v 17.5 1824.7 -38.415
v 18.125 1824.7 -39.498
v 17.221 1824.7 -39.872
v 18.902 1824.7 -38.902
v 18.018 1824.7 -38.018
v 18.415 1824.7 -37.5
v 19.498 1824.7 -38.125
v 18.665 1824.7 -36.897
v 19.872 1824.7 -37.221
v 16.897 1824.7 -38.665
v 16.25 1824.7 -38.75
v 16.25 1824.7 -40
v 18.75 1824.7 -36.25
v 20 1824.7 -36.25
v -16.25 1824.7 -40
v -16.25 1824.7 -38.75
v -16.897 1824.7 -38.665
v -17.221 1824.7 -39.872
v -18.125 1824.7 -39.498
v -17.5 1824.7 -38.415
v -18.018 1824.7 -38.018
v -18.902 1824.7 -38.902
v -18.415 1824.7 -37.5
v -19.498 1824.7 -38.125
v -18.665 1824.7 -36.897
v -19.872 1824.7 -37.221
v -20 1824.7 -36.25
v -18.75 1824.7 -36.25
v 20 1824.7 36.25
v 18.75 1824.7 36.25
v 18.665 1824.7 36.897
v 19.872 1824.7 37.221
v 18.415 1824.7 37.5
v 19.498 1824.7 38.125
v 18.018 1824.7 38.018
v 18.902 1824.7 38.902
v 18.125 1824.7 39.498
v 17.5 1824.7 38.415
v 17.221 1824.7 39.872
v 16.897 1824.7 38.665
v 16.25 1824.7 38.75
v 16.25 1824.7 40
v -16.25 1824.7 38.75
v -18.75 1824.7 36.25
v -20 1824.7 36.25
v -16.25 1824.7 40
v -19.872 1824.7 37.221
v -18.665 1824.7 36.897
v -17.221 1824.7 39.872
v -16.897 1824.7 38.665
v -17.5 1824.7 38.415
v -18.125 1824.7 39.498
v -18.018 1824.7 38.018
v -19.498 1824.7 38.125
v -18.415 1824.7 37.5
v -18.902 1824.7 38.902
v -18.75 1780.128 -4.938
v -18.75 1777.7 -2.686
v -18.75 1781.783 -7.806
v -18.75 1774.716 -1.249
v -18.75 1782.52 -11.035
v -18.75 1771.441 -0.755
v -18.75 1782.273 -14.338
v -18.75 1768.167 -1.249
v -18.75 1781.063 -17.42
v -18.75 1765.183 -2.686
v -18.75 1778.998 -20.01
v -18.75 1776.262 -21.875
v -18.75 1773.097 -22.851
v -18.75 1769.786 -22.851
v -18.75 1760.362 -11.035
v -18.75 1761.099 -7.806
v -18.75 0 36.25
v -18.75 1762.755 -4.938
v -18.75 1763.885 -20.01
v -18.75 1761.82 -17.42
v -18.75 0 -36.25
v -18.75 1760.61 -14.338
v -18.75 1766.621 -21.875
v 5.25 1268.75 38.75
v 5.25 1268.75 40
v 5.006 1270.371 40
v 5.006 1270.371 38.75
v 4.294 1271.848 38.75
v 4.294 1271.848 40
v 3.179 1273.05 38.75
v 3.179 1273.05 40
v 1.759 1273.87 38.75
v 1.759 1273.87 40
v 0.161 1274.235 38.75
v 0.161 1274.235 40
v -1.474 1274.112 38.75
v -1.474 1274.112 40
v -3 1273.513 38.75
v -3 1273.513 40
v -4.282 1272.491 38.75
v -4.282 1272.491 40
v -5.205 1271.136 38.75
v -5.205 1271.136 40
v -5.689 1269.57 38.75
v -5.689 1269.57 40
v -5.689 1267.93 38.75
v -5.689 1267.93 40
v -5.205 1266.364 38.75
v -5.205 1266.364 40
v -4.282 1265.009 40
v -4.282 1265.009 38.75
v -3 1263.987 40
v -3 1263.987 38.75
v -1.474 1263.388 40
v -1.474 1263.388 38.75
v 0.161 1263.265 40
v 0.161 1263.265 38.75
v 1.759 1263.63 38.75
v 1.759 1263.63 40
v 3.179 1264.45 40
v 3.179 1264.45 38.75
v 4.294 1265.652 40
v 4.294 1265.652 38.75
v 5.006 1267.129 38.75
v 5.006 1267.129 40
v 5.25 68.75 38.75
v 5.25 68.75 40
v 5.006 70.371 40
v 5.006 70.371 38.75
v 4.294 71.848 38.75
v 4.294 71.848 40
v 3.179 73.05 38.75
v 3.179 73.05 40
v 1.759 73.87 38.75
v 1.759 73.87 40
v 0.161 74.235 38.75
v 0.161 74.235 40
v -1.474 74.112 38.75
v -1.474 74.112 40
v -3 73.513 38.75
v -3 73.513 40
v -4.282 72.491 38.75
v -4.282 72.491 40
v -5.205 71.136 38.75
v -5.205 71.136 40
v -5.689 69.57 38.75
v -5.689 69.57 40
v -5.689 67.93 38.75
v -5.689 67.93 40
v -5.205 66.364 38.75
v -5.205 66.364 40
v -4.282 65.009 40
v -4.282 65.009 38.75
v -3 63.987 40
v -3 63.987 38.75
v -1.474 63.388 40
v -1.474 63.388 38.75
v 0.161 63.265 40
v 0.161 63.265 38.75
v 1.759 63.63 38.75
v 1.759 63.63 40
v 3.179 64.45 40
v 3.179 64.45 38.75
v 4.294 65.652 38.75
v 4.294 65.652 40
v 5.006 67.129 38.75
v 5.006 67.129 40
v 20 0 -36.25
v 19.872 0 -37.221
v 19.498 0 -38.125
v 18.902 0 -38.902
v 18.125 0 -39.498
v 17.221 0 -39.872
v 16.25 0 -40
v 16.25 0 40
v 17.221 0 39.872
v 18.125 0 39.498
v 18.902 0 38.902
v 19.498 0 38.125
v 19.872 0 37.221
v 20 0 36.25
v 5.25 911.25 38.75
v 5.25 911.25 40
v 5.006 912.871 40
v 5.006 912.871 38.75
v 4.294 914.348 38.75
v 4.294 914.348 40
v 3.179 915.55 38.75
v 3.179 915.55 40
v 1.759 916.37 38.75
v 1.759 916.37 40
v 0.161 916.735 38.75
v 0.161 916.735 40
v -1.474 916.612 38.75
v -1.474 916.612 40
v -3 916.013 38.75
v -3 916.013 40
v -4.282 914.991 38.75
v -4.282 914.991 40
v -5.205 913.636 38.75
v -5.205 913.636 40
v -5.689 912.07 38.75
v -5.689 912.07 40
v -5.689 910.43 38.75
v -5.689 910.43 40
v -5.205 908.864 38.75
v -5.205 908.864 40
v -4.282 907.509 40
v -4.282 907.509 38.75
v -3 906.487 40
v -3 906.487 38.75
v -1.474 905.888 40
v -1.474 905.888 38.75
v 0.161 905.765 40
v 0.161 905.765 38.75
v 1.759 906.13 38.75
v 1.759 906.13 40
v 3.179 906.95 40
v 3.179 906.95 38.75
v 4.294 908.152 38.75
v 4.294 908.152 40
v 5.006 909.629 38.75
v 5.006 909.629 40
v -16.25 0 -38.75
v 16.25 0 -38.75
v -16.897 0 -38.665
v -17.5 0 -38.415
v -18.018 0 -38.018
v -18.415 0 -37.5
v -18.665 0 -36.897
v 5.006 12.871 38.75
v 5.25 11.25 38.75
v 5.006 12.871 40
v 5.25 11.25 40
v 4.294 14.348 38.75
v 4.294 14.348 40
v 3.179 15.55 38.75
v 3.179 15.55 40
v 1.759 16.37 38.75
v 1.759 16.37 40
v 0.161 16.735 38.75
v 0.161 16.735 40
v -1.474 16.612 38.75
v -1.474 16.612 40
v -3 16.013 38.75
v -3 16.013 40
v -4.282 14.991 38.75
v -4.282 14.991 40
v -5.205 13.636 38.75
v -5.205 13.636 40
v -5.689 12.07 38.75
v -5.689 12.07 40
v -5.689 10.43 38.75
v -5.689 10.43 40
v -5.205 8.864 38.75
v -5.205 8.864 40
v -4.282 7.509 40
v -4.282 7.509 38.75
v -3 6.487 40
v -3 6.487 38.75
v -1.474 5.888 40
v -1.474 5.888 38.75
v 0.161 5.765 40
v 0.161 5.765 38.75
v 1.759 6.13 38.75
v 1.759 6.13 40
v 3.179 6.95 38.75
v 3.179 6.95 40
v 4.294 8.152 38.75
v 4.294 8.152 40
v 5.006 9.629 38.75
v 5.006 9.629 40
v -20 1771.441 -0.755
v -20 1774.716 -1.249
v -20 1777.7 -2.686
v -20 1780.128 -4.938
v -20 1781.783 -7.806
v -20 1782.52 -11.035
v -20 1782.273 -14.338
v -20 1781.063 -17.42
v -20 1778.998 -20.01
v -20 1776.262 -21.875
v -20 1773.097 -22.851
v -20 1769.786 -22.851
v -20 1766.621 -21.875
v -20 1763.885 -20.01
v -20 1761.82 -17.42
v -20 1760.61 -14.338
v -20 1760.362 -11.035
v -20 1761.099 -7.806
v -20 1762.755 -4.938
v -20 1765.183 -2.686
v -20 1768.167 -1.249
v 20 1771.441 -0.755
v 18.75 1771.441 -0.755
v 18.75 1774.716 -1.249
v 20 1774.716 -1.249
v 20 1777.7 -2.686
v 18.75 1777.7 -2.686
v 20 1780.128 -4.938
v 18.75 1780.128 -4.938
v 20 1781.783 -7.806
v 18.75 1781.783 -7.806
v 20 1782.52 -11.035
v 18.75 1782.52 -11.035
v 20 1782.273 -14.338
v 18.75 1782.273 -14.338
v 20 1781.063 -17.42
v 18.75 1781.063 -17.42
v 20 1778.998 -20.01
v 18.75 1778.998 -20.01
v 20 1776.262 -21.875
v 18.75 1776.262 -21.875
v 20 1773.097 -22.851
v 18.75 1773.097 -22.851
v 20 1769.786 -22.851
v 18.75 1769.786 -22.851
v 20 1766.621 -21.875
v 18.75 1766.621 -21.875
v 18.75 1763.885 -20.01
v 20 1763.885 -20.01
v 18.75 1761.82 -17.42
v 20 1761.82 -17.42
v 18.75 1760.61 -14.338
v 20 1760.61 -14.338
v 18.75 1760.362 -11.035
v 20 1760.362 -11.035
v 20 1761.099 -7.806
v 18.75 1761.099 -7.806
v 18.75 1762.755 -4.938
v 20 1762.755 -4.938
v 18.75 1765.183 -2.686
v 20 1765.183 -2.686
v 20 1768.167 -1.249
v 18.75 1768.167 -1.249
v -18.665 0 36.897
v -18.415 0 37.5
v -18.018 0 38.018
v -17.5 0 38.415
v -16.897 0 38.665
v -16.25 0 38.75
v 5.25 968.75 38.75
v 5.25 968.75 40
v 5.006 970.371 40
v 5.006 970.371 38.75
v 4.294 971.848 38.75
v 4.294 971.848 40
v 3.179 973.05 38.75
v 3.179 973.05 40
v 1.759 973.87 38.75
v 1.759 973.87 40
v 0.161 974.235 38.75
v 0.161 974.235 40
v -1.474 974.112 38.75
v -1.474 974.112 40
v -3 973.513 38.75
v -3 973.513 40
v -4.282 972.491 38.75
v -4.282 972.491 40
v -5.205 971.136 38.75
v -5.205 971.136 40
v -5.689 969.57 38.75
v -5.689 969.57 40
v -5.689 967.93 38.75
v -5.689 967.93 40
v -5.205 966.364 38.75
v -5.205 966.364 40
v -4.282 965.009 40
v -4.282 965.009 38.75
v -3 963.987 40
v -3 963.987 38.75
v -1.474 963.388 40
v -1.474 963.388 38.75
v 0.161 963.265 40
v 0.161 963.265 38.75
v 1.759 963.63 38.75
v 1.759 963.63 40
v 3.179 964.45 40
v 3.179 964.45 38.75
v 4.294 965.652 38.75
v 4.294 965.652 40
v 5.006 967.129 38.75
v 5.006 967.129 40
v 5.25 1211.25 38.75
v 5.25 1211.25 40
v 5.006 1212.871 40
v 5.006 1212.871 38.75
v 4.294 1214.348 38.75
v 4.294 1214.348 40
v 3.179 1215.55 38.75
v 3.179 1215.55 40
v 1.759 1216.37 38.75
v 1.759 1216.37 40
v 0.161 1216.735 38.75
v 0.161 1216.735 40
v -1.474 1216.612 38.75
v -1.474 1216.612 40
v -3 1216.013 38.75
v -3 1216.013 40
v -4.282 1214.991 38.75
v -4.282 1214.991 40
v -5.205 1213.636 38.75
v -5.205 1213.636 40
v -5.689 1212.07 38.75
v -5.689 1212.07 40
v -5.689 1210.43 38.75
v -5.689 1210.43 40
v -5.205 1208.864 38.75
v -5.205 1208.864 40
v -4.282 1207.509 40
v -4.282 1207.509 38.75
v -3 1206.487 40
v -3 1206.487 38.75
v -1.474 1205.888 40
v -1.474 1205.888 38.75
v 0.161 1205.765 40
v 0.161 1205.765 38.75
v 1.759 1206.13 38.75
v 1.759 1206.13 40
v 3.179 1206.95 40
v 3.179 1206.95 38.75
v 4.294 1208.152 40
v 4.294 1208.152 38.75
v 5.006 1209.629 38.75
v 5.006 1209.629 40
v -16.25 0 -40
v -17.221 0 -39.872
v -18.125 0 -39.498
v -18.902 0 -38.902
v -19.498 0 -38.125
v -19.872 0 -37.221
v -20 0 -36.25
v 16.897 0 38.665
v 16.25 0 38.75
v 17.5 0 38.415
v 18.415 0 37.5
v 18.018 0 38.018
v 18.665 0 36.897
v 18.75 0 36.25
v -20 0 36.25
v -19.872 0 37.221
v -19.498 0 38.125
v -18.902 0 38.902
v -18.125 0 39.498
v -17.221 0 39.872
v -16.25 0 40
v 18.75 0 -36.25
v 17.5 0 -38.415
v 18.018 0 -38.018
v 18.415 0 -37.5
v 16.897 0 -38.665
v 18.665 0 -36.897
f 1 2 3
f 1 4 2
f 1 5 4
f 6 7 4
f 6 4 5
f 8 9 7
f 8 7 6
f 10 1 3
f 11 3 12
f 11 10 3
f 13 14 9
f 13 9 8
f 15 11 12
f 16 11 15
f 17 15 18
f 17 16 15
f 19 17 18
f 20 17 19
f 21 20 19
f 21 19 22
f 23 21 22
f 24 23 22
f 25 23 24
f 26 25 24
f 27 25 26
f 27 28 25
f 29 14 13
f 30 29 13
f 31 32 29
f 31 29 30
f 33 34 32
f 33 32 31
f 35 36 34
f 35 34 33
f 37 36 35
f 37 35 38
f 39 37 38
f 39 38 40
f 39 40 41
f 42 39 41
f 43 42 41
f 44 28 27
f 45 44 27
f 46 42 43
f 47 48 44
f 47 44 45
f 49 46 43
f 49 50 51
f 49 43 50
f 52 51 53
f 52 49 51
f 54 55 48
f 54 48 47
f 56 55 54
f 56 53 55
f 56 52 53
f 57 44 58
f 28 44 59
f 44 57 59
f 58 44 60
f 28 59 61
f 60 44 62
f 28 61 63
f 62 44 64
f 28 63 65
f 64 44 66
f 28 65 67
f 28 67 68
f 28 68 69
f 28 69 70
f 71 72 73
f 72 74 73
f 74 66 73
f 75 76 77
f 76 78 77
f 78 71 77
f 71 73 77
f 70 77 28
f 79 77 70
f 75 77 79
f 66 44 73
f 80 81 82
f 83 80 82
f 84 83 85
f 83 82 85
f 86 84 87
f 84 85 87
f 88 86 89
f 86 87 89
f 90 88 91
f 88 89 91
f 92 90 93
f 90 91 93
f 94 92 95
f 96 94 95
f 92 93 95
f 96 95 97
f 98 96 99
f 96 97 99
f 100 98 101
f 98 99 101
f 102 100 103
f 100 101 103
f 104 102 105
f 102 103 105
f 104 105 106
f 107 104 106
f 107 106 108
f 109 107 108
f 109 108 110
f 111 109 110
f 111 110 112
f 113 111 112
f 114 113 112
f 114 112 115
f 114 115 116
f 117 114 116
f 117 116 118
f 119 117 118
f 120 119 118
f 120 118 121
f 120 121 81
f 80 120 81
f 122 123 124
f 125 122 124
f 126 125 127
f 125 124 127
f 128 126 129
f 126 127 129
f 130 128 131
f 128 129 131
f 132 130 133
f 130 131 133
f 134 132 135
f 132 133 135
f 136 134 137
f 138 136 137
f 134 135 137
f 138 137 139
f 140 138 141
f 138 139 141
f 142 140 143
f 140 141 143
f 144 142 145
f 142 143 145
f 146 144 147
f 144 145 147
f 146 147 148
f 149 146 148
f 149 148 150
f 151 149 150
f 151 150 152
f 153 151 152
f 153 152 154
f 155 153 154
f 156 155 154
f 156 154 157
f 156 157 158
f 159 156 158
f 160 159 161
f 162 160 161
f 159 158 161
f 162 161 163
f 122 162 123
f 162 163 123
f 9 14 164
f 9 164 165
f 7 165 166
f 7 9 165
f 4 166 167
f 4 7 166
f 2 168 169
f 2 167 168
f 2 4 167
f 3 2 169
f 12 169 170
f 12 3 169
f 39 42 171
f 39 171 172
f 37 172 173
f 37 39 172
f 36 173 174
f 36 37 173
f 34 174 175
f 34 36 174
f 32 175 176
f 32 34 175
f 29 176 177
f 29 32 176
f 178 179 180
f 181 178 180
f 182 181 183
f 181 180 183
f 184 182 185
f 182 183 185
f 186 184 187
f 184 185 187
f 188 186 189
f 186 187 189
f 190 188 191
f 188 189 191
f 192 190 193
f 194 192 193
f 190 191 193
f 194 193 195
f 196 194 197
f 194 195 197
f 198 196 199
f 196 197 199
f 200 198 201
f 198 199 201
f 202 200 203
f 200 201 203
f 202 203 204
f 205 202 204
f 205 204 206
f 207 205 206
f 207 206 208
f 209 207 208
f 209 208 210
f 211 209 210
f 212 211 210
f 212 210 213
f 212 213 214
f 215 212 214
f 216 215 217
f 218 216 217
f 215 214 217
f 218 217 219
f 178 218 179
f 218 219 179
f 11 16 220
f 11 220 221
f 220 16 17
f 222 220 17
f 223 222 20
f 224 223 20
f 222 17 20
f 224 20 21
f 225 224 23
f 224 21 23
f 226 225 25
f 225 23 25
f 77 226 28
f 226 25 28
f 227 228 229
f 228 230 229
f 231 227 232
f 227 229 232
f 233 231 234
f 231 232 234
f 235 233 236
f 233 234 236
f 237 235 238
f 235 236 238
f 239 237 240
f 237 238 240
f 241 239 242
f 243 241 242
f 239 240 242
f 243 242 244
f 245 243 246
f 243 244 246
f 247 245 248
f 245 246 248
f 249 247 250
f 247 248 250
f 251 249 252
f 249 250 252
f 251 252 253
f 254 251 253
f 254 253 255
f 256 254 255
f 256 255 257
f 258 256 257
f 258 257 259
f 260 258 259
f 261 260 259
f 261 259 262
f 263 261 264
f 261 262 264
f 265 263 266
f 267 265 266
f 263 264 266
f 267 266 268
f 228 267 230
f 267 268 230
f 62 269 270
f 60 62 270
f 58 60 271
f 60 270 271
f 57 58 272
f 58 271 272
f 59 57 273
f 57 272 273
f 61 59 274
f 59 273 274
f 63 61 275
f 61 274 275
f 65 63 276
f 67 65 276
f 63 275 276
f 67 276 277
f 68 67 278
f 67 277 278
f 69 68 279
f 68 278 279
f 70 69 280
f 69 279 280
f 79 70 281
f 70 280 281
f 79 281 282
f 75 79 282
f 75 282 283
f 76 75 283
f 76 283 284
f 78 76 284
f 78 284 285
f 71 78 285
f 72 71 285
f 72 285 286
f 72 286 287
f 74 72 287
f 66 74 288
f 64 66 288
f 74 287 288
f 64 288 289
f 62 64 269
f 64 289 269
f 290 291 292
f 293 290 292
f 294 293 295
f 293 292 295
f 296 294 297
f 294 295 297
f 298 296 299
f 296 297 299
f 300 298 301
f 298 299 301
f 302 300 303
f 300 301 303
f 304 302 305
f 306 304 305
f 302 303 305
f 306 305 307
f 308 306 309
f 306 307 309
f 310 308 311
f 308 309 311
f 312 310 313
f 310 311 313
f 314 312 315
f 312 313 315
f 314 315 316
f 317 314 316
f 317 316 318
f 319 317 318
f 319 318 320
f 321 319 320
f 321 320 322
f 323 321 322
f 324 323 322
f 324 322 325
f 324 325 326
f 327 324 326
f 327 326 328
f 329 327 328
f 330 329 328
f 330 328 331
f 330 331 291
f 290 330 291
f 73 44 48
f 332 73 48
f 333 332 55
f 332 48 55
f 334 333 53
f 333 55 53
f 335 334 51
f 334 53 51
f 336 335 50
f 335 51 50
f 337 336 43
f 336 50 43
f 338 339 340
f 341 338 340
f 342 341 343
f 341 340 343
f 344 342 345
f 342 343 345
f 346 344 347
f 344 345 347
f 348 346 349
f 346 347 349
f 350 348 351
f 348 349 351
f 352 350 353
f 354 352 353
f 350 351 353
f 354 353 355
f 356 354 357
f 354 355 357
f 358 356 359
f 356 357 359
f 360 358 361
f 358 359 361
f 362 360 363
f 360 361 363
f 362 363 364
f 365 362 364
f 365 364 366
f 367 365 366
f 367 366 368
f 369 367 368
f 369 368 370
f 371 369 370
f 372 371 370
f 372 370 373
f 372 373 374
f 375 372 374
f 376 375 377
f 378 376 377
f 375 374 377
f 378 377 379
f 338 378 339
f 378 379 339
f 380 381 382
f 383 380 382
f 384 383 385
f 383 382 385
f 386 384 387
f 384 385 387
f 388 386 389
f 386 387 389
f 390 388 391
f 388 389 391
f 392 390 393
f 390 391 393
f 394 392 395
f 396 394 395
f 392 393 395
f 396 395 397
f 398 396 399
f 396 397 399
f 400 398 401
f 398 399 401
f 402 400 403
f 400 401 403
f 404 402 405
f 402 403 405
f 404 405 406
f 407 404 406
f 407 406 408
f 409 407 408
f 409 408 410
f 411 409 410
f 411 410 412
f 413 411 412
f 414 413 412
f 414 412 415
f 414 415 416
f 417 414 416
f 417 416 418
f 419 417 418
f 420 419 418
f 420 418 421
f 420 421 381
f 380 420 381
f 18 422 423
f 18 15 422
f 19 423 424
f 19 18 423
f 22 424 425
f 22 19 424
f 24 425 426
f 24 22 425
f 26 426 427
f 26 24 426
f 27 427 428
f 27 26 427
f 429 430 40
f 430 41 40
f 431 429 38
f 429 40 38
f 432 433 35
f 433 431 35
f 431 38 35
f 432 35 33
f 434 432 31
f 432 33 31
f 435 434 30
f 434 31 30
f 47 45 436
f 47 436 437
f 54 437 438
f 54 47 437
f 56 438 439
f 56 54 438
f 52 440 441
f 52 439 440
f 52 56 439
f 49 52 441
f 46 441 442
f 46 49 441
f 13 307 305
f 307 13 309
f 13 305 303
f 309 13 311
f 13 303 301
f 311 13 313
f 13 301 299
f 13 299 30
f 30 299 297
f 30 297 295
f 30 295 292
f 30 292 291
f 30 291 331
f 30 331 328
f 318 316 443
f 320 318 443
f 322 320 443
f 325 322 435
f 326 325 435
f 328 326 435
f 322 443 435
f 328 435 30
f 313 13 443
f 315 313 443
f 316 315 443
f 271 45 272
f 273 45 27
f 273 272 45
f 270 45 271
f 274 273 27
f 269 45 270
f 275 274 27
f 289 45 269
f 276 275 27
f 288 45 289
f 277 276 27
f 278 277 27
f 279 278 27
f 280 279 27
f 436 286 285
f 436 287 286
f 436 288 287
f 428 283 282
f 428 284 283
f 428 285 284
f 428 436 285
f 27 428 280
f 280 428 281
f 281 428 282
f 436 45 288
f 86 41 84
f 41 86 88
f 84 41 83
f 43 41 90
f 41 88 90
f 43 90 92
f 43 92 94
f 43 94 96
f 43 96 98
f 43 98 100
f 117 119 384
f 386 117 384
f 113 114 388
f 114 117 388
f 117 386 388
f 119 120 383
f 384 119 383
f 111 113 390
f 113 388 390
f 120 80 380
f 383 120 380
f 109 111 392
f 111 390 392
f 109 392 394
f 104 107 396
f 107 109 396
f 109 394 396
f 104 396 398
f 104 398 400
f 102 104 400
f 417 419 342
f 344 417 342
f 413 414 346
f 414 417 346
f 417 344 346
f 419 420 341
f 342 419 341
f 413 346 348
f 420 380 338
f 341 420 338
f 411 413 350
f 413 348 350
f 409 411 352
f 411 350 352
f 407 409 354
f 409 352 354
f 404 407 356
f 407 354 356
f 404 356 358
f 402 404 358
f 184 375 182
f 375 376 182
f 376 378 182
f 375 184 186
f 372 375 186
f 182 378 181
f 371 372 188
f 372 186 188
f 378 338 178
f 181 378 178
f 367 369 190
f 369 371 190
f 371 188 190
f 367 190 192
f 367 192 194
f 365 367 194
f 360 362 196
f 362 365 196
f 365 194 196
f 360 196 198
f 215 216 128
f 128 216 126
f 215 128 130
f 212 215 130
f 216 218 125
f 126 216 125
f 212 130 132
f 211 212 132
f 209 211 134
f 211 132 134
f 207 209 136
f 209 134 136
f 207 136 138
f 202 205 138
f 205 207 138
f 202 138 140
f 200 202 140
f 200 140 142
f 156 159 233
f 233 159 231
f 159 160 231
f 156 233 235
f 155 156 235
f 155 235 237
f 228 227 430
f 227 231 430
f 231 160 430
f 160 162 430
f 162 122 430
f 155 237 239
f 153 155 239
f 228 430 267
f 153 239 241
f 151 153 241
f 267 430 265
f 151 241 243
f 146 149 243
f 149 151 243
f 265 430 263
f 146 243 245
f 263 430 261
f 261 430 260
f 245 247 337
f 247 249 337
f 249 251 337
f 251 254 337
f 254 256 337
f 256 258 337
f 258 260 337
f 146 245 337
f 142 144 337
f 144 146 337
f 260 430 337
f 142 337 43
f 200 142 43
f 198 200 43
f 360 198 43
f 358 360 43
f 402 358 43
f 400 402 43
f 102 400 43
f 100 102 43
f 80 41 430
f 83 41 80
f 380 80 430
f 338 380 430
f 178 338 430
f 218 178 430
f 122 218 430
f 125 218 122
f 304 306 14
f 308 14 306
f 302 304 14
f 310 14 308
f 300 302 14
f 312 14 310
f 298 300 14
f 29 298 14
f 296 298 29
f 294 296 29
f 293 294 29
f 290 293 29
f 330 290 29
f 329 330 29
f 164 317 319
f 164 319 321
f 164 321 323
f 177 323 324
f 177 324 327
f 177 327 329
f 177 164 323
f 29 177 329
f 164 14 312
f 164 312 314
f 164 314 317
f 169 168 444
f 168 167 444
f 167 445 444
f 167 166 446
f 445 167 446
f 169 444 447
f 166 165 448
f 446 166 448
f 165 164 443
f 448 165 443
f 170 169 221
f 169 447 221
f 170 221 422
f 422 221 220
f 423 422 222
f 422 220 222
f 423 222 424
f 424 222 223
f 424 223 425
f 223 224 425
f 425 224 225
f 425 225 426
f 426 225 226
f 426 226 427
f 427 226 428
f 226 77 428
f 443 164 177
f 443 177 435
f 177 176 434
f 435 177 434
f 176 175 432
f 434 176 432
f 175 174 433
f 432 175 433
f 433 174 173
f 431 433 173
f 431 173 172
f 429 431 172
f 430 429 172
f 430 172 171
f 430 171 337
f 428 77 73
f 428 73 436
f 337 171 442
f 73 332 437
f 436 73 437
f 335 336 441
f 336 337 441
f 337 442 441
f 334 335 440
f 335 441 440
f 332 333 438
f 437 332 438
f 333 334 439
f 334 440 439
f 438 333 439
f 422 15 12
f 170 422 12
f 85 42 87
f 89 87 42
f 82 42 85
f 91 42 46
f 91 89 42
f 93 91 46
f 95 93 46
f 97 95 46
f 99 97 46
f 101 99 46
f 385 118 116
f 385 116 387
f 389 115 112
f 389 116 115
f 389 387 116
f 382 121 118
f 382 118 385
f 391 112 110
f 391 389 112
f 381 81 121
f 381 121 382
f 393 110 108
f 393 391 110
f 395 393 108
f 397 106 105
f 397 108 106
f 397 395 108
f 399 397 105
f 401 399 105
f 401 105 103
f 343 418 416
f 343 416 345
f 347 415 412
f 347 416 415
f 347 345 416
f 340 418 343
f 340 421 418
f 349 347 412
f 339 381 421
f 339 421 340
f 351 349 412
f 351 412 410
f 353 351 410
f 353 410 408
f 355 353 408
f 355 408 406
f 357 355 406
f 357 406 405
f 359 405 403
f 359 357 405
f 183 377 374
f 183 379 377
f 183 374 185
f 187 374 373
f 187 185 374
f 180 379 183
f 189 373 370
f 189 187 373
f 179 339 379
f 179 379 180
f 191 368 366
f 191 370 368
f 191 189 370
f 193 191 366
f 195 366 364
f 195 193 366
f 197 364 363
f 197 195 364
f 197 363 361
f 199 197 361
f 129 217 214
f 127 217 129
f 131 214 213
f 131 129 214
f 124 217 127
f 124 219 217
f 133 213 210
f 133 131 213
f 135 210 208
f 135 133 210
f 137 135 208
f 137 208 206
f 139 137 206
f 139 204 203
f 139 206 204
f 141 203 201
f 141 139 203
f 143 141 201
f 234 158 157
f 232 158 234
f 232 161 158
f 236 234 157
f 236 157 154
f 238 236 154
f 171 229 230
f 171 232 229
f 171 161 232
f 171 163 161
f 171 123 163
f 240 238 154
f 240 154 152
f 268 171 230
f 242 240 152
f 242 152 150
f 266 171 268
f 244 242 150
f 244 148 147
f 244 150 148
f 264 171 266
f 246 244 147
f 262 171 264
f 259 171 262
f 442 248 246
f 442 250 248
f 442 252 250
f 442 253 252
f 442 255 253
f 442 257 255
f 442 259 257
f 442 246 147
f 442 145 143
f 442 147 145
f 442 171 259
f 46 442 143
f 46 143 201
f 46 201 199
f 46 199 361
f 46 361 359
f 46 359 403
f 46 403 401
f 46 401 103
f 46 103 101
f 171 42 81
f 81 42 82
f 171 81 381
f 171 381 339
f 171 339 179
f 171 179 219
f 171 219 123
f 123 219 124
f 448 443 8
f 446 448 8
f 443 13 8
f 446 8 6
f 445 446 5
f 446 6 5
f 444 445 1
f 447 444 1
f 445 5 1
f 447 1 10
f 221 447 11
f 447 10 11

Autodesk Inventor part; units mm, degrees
ref_plane "YZ Plane" through (0, 0, 0) normal (1, 0, 0) x (0, 1, 0)
ref_plane "XZ Plane" through (0, 0, 0) normal (0, 1, 0) x (-1, 0, 0)
ref_plane "XY Plane" through (0, 0, 0) normal (0, 0, 1) x (1, 0, 0)
sketch "Sketch1" plane through (0, 0, 0) normal (0, 1, 0) x (-1, 0, 0)
  line L0 (-20, 40) -> (20, 40)
  line L1 (20, 40) -> (20, -40)
  line L2 (20, -40) -> (-20, -40)
  line L3 (-20, -40) -> (-20, 40)
  line L4 (-20, 40) -> (20, -40) construction
  line L5 (20, 40) -> (-20, -40) construction
  line L6 (-18.75, 38.75) -> (18.75, 38.75)
  line L7 (18.75, 38.75) -> (18.75, -38.75)
  line L8 (18.75, -38.75) -> (-18.75, -38.75)
  line L9 (-18.75, -38.75) -> (-18.75, 38.75)
  line L10 (-18.75, 38.75) -> (18.75, -38.75) construction
  line L11 (18.75, 38.75) -> (-18.75, -38.75) construction
  point P0 (0, 0)
  dimension "d0" = 40
  dimension "d1" = 80
  dimension "d2" = 37.5
  dimension "d19" = 77.5
extrude "Extrusion1" add sketch "Sketch1" along normal blind 1824.7
fillet "Fillet1" radius 2.5 4 edges at (-18.75, 912.35, 38.75) (18.75, 912.35, -38.75) (18.75, 912.35, 38.75) (-18.75, 912.35, -38.75)
fillet "Fillet1" radius 3.75 4 edges at (20, 912.35, 40) (-20, 912.35, 40) (20, 912.35, -40) (-20, 912.35, -40)
sketch "Boceto3" plane through (-16.25, 0, 40) normal (0, 0, 1) x (1, 0, 0)
  circle A0 centre (16, 11.25) radius 4.5 projected
  circle A1 centre (16, 68.75) radius 4.5 projected
  circle A2 centre (16, 911.25) radius 4.5 projected
  circle A3 centre (16, 968.75) radius 4.5 projected
  circle A4 centre (16, 1268.75) radius 4.5 projected
  circle A5 centre (16, 1211.25) radius 4.5 projected
  circle A6 centre (16, 11.25) radius 5.5
  circle A7 centre (16, 68.75) radius 5.5
  circle A8 centre (16, 911.25) radius 5.5
  circle A9 centre (16, 968.75) radius 5.5
  circle A10 centre (16, 1268.75) radius 5.5
  circle A11 centre (16, 1211.25) radius 5.5
  point P0 (16.25, 0)
  dimension "d11" = 11
  dimension "d12" = 11
  dimension "d13" = 11
  dimension "d14" = 11
  dimension "d15" = 11
  dimension "d16" = 11
extrude "Extrusión3" cut sketch "Boceto3" against normal blind 10 contours A0 | A1 | A2 | A3 | A4 | A5 | A6 | A7 | A8 | A9 | A10 | A11
sketch "Sketch6" plane through (-20, 0, -36.25) normal (-1, 0, 0) x (0, 0, 1)
  point P0 (36.25, 0)
sketch "Sketch8" plane through (-20, 0, -36.25) normal (-1, 0, 0) x (0, 0, 1)
  circle A0 centre (24.3846, 1771.4414) radius 11.11 projected
  point P0 (36.25, 0)
extrude "Extrusion7" cut sketch "Sketch8" against normal through all
properties part number "tubo1-40x40x1800" material "Acero, carbono"
